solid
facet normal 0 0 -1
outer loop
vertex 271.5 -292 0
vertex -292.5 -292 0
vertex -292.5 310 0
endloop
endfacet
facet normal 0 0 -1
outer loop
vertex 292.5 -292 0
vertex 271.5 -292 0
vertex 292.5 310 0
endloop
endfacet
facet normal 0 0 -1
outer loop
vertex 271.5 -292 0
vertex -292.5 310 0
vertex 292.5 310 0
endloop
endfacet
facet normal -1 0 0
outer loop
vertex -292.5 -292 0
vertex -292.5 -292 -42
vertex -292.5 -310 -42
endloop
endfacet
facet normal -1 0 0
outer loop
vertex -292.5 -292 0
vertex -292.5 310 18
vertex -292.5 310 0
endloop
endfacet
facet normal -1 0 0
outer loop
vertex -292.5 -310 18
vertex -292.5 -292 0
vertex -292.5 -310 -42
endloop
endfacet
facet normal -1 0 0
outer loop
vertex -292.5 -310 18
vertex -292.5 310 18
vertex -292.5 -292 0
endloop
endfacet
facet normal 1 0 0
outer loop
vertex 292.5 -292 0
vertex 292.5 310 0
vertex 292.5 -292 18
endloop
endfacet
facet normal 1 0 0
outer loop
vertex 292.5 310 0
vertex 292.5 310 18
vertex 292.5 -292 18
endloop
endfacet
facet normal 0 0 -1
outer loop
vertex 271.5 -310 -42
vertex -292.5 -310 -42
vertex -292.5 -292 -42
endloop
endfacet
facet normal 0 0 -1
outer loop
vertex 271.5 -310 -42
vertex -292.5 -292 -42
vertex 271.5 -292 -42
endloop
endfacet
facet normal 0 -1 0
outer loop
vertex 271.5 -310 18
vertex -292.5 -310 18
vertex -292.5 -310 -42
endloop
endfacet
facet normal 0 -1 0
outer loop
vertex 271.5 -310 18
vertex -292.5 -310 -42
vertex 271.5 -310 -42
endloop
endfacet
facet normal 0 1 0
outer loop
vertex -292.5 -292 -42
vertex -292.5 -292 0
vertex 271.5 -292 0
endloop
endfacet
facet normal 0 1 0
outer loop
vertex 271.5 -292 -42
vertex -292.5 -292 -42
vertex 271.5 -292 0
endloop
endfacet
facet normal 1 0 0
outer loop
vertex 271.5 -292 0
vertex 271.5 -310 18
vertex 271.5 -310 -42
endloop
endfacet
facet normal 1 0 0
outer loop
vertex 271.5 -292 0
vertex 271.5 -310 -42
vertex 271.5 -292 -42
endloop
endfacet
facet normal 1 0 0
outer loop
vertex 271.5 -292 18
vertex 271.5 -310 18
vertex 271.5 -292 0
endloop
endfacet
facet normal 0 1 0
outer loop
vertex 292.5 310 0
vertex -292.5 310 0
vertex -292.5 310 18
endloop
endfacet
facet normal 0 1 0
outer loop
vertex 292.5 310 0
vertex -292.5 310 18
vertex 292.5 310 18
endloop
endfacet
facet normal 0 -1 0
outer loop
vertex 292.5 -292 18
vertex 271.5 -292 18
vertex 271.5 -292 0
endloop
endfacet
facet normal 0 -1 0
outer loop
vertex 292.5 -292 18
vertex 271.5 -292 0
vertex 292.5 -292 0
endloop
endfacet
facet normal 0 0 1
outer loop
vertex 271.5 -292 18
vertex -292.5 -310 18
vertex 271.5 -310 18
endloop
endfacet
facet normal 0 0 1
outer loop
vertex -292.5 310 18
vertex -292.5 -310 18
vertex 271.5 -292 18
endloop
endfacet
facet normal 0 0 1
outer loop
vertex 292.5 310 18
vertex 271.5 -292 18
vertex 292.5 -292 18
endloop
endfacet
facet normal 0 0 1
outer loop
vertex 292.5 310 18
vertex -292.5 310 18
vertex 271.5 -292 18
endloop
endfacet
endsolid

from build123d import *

# Parameters (mm, degrees)
F0_W     = 585
F0_H     = 620
F1_DEPTH = 18
F2_W     = 585
F2_H     = 18
F3_DEPTH = 42
F4_W     = 21
F4_H     = 18
F5_DEPTH = 60


with BuildPart() as f1:
    # F0 (on Top) → F1 (new body)
    with BuildSketch(Plane.XY):
        Rectangle(F0_W, F0_H)
    extrude(amount=F1_DEPTH)

    # F2 (on face) → F3 (join)
    with BuildSketch(Plane(origin=(0, 0, 0), x_dir=(1, 0, 0), z_dir=(0, 0, -1))):
        with Locations((0, 301)):
            Rectangle(F2_W, F2_H)
    extrude(amount=F3_DEPTH)

    # F4 (on face) → F5 (cut)
    with BuildSketch(Plane.XY.offset(18)):
        with Locations((282, -301)):
            Rectangle(F4_W, F4_H)
    extrude(amount=-F5_DEPTH, mode=Mode.SUBTRACT)


solid = f1.part
